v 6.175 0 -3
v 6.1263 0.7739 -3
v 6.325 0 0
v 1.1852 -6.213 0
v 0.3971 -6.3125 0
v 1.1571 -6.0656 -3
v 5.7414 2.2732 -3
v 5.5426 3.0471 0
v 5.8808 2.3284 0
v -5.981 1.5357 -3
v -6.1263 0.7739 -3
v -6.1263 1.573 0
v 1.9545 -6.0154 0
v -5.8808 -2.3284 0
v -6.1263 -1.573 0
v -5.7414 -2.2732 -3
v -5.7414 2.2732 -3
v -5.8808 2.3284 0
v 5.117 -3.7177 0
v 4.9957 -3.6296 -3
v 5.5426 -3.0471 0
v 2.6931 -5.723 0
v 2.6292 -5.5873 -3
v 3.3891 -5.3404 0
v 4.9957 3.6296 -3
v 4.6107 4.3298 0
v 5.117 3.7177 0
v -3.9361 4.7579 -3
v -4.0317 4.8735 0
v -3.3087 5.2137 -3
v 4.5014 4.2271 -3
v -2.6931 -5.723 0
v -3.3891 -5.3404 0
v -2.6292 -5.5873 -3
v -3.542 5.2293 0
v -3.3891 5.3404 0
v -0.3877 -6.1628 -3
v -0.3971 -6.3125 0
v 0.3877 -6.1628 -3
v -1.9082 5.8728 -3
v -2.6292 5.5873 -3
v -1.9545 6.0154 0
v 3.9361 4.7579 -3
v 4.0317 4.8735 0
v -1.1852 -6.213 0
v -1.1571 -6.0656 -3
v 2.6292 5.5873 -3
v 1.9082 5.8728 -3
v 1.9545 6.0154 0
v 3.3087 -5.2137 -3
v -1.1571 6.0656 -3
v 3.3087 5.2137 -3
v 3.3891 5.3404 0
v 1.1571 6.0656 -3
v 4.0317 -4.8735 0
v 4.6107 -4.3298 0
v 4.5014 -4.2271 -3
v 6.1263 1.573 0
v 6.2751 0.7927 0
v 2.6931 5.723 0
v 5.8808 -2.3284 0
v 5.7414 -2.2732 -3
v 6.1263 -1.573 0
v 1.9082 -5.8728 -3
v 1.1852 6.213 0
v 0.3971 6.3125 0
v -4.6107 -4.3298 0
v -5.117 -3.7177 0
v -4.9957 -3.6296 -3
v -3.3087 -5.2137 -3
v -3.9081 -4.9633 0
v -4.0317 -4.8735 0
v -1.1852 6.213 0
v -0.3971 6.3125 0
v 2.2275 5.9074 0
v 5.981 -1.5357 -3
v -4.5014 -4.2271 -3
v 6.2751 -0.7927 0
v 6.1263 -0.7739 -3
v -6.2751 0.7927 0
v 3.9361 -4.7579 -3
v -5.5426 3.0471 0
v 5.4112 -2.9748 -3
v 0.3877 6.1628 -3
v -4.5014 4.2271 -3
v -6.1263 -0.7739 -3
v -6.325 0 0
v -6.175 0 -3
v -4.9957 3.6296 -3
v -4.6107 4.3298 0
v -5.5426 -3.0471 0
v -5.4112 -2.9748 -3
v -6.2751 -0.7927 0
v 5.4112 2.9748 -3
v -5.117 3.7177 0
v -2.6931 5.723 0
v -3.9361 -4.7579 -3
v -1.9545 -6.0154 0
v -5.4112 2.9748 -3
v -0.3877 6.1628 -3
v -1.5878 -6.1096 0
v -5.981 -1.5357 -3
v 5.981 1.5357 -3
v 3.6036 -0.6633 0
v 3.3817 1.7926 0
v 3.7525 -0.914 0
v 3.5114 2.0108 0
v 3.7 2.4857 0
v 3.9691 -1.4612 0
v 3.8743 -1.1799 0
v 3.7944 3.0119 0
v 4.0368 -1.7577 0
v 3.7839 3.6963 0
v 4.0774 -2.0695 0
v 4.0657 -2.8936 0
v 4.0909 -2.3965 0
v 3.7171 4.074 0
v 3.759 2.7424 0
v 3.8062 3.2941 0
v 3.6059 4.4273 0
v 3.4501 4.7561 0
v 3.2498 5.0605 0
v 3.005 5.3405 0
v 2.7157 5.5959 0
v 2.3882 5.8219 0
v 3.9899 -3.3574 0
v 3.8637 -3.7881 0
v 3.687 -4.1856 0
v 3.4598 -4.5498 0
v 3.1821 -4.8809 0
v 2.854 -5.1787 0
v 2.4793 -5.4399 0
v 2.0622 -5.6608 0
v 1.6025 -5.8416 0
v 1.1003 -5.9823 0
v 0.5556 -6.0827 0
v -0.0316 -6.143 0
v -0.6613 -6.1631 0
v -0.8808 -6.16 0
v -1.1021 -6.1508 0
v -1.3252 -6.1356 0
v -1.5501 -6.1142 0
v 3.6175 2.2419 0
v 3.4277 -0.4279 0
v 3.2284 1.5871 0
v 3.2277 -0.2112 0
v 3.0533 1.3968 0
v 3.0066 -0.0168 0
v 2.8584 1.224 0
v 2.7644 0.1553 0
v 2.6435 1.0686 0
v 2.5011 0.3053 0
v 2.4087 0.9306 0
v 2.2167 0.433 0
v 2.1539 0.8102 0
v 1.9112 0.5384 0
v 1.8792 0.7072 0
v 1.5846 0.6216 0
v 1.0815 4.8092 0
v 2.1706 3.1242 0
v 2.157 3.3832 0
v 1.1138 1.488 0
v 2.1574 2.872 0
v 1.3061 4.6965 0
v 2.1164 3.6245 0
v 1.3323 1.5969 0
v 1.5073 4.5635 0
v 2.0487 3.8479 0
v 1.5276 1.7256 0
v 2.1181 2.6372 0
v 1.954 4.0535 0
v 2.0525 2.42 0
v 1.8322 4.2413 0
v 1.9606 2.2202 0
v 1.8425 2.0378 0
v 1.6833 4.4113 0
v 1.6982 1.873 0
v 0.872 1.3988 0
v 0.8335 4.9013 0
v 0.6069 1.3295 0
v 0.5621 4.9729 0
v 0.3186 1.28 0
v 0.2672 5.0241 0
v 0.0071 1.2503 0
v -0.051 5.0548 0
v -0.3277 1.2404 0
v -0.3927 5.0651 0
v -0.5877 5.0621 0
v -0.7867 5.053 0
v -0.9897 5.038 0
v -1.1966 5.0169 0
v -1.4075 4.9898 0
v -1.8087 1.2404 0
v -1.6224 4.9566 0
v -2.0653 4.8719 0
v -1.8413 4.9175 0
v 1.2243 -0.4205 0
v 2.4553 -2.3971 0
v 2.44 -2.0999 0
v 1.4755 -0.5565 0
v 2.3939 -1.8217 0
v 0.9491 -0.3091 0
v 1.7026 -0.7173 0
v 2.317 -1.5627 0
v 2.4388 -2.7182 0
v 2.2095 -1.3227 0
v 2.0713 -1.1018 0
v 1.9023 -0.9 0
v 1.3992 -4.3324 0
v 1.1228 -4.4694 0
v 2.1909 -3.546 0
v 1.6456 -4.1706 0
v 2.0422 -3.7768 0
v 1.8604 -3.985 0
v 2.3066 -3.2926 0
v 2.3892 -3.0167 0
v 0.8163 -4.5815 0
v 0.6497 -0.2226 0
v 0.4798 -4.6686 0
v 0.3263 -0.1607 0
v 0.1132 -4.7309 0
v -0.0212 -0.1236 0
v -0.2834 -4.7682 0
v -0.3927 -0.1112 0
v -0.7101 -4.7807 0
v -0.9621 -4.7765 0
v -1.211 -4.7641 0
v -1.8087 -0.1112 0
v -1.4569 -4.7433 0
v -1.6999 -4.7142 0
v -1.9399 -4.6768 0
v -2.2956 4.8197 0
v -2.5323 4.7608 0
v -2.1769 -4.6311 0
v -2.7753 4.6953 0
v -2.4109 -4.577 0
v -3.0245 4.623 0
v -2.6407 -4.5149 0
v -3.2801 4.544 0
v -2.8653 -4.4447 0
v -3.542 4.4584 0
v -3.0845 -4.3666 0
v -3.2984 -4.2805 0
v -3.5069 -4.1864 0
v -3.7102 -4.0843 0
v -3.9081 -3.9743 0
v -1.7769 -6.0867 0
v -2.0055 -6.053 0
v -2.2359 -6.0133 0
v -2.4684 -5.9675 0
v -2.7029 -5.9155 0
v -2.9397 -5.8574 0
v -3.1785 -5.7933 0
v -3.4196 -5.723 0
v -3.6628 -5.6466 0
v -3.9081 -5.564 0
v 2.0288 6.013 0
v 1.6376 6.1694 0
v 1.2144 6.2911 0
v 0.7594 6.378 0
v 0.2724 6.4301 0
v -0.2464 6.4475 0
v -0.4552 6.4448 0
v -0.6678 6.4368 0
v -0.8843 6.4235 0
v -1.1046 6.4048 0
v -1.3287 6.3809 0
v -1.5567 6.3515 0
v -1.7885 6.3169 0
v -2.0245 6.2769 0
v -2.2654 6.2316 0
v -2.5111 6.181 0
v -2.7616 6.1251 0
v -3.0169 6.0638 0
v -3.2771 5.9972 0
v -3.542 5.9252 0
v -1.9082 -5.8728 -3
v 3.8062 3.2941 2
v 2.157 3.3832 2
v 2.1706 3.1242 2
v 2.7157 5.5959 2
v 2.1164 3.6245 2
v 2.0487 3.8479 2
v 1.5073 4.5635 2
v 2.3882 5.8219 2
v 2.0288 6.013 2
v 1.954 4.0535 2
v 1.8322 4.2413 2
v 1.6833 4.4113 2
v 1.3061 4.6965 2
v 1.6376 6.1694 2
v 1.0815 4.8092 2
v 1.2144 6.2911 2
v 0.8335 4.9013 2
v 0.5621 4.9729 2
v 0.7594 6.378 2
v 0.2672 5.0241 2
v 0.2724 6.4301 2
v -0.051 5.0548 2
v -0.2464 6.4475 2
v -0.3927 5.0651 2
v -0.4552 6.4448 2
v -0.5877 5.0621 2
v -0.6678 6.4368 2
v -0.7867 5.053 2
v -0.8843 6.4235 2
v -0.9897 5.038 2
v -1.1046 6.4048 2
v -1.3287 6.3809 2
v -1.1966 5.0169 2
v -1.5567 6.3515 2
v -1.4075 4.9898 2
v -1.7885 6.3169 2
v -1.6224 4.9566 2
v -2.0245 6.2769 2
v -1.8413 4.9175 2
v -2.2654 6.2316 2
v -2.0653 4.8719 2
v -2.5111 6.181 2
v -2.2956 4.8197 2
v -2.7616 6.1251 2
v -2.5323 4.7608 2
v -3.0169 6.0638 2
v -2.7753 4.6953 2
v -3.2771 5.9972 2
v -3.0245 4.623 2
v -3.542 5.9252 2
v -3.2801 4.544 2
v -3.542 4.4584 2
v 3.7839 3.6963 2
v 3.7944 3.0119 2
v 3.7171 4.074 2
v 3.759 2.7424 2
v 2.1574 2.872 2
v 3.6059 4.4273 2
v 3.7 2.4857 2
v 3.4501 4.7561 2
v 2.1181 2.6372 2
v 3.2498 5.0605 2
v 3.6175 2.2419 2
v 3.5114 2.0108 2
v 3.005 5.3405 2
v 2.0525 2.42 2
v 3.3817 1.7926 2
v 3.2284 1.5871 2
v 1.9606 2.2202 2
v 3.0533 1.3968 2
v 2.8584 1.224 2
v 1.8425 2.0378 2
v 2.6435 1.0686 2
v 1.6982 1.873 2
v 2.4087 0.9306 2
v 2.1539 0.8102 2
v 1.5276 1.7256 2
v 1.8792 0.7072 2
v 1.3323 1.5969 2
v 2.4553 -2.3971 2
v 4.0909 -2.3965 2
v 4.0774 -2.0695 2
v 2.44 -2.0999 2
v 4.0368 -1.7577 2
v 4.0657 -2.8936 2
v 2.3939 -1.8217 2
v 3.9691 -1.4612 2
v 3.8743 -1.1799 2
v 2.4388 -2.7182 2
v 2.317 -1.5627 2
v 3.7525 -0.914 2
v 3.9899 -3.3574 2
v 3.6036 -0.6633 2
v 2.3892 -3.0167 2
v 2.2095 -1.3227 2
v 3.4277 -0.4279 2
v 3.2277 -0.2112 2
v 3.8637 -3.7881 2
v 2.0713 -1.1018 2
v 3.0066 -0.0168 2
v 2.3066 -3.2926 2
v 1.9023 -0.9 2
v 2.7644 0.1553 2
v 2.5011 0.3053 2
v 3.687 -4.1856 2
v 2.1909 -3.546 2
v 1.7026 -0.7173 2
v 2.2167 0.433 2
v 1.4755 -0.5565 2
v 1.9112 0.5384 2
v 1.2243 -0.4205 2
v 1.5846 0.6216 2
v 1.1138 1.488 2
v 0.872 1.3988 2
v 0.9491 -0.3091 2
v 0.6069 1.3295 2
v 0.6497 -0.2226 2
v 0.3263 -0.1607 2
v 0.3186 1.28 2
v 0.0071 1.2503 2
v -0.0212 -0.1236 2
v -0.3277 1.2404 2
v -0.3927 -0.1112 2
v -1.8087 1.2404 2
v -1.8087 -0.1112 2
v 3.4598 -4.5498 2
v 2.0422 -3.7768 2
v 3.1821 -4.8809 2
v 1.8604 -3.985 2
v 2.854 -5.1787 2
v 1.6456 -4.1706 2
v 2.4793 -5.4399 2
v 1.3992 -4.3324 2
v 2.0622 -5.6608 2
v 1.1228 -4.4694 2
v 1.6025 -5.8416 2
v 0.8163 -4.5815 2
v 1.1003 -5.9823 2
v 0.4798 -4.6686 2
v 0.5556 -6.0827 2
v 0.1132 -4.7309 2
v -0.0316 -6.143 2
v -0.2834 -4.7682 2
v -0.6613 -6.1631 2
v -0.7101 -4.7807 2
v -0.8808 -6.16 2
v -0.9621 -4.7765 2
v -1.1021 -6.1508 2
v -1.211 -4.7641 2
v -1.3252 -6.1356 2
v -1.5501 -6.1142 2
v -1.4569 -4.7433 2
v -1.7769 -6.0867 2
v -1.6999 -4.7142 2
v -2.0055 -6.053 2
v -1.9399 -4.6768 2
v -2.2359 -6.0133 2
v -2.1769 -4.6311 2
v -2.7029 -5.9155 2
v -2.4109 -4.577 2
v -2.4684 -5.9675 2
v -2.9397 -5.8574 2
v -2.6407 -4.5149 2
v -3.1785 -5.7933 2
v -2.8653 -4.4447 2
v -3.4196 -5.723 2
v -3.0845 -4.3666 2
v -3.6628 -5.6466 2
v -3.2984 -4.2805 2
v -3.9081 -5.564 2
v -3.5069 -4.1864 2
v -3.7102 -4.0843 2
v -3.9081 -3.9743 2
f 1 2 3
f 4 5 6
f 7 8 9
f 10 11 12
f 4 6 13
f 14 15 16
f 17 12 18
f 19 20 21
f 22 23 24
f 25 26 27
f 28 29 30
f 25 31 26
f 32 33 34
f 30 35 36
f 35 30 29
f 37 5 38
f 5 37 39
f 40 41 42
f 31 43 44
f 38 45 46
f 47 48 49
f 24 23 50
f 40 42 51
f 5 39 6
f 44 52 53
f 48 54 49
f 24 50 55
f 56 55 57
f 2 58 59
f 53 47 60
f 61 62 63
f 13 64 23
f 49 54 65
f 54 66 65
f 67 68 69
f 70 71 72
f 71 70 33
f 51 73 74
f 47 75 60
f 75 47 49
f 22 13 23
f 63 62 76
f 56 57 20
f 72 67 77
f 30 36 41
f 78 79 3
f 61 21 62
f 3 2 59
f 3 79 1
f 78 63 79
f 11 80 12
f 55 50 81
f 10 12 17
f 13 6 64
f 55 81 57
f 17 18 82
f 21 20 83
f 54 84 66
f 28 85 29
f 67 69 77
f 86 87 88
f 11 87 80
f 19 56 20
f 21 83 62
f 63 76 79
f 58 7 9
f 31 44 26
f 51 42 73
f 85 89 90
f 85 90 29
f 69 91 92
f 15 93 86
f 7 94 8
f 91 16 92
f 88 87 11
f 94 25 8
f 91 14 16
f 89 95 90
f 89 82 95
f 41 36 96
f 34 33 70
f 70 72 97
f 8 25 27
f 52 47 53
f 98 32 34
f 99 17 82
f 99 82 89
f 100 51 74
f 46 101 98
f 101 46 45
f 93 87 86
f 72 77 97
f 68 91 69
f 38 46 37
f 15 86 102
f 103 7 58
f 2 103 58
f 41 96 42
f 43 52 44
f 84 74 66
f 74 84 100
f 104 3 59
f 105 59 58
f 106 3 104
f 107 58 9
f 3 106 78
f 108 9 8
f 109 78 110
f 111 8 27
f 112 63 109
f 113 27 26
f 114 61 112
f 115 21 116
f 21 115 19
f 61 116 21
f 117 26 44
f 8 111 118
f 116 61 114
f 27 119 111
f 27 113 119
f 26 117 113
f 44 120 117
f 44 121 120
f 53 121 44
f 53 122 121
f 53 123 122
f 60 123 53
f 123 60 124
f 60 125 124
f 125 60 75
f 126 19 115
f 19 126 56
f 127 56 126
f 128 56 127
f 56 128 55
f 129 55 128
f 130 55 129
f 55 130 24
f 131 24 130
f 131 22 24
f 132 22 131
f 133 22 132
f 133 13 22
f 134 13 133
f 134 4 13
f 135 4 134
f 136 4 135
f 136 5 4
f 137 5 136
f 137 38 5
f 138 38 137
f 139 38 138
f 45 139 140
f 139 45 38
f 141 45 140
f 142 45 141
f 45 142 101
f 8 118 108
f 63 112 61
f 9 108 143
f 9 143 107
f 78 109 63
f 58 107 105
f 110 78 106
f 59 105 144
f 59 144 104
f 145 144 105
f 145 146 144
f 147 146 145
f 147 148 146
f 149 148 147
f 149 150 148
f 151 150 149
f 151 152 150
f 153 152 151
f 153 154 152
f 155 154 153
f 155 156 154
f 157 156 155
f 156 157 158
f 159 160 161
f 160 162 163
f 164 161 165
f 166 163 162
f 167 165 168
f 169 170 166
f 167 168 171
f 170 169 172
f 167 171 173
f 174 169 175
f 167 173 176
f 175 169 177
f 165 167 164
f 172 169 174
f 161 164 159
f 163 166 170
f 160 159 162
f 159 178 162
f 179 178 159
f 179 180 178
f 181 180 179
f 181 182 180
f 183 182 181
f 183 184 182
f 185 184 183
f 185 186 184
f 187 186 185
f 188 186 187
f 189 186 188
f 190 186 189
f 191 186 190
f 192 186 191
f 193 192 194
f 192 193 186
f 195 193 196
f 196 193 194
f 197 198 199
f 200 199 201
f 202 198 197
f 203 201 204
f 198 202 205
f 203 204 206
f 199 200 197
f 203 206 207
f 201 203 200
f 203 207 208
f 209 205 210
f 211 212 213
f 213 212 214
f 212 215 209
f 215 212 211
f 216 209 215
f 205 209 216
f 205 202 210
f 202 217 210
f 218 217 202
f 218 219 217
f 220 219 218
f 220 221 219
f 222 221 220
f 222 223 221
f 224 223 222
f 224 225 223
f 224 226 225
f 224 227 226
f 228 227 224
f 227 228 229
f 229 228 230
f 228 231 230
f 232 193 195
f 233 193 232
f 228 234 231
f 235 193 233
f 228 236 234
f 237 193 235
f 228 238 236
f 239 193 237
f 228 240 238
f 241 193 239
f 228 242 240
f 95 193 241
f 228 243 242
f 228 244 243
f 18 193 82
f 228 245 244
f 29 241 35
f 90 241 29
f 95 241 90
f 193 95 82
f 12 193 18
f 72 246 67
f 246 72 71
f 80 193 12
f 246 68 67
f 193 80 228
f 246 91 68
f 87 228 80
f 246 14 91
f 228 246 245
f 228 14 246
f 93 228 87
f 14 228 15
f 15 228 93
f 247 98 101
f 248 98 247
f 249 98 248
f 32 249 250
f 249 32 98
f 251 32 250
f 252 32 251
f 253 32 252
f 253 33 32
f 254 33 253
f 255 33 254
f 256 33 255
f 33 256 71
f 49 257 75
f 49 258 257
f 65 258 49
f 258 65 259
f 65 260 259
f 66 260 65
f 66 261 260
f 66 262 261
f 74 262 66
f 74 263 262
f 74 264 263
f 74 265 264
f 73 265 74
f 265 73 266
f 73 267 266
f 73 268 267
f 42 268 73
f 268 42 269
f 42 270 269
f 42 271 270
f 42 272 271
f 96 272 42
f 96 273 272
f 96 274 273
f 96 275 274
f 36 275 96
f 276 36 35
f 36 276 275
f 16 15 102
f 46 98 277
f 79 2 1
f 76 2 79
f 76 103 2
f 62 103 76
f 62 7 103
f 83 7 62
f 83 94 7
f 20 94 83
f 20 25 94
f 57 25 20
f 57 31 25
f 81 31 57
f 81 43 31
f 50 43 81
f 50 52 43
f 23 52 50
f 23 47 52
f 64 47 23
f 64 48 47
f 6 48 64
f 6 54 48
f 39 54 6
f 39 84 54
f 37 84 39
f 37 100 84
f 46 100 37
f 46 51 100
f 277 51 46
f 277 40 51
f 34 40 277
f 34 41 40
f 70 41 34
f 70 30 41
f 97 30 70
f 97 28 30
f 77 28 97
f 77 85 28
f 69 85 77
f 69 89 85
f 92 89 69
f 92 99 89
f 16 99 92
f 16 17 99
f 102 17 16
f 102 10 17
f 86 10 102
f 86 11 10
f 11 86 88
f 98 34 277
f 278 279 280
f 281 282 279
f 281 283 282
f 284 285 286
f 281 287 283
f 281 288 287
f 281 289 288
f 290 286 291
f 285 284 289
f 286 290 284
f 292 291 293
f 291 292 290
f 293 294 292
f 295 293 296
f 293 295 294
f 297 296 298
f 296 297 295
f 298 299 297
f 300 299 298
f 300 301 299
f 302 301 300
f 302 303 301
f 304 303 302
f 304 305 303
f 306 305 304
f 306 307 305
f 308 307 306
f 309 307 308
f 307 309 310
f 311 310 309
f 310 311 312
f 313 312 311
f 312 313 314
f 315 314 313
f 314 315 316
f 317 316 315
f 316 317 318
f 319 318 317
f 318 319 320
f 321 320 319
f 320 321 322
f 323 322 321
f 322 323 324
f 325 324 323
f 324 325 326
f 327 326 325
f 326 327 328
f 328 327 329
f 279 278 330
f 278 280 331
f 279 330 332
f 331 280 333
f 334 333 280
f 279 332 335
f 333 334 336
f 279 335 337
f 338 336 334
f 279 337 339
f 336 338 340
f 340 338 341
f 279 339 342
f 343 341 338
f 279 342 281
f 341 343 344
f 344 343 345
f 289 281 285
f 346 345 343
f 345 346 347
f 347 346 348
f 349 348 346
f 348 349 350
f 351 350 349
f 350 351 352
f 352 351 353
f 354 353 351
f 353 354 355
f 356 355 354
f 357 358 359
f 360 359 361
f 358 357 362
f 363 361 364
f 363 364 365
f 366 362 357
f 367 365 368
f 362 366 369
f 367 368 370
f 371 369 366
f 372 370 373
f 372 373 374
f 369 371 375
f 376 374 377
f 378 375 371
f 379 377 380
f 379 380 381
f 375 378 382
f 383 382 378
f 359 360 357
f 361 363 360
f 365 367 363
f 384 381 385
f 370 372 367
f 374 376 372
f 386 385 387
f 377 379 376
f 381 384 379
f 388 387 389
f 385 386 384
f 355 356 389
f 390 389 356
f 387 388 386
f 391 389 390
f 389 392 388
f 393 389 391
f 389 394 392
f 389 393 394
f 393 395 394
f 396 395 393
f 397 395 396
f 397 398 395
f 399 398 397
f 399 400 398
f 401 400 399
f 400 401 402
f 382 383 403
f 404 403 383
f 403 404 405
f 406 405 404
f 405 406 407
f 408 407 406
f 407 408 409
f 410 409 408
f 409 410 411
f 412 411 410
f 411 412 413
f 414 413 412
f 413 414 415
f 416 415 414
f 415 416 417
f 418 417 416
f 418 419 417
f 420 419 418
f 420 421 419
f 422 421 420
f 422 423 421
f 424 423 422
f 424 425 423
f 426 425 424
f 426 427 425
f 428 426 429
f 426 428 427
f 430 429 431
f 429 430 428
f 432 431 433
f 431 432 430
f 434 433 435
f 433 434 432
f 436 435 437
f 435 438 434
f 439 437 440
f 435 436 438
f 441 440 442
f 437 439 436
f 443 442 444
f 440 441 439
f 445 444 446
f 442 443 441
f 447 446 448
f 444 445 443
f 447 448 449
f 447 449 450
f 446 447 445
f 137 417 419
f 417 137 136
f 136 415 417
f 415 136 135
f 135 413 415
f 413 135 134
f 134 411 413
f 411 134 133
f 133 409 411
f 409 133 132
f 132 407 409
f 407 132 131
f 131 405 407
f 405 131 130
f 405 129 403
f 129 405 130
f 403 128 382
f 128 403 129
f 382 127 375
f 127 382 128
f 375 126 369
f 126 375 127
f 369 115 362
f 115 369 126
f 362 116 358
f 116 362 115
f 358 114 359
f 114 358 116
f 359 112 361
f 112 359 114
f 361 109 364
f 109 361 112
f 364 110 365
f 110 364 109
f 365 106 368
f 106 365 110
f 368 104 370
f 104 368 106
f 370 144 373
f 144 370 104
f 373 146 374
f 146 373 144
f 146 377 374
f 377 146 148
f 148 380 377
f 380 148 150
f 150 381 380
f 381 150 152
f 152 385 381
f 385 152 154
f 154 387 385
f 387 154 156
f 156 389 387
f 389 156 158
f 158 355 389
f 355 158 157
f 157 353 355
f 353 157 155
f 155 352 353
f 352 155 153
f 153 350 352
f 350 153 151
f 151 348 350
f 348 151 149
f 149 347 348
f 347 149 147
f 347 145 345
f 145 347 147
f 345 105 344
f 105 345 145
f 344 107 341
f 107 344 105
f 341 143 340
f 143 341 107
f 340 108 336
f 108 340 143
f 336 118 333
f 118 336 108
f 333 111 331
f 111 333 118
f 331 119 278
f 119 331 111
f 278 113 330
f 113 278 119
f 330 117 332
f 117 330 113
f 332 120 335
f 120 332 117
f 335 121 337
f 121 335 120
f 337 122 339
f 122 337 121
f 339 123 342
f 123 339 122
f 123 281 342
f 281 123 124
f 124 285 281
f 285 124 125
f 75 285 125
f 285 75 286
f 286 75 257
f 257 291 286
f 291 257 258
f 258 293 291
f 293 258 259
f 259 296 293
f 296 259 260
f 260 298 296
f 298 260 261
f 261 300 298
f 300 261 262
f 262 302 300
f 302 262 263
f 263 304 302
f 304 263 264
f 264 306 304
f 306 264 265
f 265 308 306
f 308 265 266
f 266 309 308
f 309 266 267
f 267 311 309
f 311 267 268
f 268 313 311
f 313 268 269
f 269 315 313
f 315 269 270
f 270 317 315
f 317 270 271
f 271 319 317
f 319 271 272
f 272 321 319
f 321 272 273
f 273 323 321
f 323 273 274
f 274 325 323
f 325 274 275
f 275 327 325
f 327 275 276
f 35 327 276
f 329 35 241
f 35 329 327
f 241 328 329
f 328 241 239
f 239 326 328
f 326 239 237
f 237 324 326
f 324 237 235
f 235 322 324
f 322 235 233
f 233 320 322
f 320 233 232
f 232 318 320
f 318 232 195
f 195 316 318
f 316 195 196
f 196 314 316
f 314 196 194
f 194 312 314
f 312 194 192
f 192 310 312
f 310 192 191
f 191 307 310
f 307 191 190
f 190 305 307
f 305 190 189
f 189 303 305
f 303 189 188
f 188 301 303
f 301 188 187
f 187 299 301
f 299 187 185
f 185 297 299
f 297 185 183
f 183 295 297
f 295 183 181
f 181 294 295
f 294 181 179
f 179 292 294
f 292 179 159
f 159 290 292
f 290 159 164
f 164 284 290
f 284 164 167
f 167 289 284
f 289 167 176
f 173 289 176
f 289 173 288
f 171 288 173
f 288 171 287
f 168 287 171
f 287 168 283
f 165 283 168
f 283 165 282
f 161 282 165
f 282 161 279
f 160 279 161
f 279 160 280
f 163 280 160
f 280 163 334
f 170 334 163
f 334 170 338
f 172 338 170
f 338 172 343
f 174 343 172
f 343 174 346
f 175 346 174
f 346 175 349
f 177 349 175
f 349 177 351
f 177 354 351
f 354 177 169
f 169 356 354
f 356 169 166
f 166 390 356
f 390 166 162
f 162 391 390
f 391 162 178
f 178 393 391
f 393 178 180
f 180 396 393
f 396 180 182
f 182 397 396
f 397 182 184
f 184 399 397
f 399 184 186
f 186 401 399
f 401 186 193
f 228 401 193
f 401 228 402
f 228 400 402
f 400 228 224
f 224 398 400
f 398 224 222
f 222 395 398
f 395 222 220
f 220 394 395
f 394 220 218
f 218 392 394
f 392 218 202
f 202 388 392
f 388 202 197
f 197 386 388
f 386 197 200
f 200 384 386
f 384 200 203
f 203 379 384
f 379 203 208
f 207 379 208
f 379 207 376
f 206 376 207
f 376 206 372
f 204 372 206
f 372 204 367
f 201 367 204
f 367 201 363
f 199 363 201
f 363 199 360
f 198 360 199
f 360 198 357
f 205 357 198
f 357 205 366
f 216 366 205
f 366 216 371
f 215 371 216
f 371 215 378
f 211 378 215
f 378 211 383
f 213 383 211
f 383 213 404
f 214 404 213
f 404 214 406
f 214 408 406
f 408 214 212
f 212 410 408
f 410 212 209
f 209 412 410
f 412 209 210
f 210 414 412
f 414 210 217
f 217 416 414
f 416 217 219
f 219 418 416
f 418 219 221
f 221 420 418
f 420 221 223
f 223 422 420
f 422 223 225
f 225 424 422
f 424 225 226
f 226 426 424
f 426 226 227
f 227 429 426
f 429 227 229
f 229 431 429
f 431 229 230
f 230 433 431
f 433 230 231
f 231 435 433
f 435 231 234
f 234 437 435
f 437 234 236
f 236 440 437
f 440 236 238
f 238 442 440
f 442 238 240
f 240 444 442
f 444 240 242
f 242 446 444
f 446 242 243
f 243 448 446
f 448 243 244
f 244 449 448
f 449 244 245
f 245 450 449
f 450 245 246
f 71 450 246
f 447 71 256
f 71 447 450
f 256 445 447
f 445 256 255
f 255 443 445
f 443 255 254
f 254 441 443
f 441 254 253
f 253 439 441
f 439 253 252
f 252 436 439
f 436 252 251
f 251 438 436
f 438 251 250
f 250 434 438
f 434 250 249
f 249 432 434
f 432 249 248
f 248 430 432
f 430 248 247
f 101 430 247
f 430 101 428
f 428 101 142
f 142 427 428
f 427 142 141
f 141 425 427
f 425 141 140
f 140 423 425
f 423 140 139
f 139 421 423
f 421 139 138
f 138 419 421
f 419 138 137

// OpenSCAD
$fn = 50;


difference() {
	union() {
		translate(v = [0, 0, -3.0000000000]) {
			cylinder(h = 3, r1 = 6.1750000000, r2 = 6.3250000000);
		}
		linear_extrude(height = 2) {
			text(font = "Impact", halign = "center", size = 12, text = "3", valign = "center");
		}
	}
	union();
}
